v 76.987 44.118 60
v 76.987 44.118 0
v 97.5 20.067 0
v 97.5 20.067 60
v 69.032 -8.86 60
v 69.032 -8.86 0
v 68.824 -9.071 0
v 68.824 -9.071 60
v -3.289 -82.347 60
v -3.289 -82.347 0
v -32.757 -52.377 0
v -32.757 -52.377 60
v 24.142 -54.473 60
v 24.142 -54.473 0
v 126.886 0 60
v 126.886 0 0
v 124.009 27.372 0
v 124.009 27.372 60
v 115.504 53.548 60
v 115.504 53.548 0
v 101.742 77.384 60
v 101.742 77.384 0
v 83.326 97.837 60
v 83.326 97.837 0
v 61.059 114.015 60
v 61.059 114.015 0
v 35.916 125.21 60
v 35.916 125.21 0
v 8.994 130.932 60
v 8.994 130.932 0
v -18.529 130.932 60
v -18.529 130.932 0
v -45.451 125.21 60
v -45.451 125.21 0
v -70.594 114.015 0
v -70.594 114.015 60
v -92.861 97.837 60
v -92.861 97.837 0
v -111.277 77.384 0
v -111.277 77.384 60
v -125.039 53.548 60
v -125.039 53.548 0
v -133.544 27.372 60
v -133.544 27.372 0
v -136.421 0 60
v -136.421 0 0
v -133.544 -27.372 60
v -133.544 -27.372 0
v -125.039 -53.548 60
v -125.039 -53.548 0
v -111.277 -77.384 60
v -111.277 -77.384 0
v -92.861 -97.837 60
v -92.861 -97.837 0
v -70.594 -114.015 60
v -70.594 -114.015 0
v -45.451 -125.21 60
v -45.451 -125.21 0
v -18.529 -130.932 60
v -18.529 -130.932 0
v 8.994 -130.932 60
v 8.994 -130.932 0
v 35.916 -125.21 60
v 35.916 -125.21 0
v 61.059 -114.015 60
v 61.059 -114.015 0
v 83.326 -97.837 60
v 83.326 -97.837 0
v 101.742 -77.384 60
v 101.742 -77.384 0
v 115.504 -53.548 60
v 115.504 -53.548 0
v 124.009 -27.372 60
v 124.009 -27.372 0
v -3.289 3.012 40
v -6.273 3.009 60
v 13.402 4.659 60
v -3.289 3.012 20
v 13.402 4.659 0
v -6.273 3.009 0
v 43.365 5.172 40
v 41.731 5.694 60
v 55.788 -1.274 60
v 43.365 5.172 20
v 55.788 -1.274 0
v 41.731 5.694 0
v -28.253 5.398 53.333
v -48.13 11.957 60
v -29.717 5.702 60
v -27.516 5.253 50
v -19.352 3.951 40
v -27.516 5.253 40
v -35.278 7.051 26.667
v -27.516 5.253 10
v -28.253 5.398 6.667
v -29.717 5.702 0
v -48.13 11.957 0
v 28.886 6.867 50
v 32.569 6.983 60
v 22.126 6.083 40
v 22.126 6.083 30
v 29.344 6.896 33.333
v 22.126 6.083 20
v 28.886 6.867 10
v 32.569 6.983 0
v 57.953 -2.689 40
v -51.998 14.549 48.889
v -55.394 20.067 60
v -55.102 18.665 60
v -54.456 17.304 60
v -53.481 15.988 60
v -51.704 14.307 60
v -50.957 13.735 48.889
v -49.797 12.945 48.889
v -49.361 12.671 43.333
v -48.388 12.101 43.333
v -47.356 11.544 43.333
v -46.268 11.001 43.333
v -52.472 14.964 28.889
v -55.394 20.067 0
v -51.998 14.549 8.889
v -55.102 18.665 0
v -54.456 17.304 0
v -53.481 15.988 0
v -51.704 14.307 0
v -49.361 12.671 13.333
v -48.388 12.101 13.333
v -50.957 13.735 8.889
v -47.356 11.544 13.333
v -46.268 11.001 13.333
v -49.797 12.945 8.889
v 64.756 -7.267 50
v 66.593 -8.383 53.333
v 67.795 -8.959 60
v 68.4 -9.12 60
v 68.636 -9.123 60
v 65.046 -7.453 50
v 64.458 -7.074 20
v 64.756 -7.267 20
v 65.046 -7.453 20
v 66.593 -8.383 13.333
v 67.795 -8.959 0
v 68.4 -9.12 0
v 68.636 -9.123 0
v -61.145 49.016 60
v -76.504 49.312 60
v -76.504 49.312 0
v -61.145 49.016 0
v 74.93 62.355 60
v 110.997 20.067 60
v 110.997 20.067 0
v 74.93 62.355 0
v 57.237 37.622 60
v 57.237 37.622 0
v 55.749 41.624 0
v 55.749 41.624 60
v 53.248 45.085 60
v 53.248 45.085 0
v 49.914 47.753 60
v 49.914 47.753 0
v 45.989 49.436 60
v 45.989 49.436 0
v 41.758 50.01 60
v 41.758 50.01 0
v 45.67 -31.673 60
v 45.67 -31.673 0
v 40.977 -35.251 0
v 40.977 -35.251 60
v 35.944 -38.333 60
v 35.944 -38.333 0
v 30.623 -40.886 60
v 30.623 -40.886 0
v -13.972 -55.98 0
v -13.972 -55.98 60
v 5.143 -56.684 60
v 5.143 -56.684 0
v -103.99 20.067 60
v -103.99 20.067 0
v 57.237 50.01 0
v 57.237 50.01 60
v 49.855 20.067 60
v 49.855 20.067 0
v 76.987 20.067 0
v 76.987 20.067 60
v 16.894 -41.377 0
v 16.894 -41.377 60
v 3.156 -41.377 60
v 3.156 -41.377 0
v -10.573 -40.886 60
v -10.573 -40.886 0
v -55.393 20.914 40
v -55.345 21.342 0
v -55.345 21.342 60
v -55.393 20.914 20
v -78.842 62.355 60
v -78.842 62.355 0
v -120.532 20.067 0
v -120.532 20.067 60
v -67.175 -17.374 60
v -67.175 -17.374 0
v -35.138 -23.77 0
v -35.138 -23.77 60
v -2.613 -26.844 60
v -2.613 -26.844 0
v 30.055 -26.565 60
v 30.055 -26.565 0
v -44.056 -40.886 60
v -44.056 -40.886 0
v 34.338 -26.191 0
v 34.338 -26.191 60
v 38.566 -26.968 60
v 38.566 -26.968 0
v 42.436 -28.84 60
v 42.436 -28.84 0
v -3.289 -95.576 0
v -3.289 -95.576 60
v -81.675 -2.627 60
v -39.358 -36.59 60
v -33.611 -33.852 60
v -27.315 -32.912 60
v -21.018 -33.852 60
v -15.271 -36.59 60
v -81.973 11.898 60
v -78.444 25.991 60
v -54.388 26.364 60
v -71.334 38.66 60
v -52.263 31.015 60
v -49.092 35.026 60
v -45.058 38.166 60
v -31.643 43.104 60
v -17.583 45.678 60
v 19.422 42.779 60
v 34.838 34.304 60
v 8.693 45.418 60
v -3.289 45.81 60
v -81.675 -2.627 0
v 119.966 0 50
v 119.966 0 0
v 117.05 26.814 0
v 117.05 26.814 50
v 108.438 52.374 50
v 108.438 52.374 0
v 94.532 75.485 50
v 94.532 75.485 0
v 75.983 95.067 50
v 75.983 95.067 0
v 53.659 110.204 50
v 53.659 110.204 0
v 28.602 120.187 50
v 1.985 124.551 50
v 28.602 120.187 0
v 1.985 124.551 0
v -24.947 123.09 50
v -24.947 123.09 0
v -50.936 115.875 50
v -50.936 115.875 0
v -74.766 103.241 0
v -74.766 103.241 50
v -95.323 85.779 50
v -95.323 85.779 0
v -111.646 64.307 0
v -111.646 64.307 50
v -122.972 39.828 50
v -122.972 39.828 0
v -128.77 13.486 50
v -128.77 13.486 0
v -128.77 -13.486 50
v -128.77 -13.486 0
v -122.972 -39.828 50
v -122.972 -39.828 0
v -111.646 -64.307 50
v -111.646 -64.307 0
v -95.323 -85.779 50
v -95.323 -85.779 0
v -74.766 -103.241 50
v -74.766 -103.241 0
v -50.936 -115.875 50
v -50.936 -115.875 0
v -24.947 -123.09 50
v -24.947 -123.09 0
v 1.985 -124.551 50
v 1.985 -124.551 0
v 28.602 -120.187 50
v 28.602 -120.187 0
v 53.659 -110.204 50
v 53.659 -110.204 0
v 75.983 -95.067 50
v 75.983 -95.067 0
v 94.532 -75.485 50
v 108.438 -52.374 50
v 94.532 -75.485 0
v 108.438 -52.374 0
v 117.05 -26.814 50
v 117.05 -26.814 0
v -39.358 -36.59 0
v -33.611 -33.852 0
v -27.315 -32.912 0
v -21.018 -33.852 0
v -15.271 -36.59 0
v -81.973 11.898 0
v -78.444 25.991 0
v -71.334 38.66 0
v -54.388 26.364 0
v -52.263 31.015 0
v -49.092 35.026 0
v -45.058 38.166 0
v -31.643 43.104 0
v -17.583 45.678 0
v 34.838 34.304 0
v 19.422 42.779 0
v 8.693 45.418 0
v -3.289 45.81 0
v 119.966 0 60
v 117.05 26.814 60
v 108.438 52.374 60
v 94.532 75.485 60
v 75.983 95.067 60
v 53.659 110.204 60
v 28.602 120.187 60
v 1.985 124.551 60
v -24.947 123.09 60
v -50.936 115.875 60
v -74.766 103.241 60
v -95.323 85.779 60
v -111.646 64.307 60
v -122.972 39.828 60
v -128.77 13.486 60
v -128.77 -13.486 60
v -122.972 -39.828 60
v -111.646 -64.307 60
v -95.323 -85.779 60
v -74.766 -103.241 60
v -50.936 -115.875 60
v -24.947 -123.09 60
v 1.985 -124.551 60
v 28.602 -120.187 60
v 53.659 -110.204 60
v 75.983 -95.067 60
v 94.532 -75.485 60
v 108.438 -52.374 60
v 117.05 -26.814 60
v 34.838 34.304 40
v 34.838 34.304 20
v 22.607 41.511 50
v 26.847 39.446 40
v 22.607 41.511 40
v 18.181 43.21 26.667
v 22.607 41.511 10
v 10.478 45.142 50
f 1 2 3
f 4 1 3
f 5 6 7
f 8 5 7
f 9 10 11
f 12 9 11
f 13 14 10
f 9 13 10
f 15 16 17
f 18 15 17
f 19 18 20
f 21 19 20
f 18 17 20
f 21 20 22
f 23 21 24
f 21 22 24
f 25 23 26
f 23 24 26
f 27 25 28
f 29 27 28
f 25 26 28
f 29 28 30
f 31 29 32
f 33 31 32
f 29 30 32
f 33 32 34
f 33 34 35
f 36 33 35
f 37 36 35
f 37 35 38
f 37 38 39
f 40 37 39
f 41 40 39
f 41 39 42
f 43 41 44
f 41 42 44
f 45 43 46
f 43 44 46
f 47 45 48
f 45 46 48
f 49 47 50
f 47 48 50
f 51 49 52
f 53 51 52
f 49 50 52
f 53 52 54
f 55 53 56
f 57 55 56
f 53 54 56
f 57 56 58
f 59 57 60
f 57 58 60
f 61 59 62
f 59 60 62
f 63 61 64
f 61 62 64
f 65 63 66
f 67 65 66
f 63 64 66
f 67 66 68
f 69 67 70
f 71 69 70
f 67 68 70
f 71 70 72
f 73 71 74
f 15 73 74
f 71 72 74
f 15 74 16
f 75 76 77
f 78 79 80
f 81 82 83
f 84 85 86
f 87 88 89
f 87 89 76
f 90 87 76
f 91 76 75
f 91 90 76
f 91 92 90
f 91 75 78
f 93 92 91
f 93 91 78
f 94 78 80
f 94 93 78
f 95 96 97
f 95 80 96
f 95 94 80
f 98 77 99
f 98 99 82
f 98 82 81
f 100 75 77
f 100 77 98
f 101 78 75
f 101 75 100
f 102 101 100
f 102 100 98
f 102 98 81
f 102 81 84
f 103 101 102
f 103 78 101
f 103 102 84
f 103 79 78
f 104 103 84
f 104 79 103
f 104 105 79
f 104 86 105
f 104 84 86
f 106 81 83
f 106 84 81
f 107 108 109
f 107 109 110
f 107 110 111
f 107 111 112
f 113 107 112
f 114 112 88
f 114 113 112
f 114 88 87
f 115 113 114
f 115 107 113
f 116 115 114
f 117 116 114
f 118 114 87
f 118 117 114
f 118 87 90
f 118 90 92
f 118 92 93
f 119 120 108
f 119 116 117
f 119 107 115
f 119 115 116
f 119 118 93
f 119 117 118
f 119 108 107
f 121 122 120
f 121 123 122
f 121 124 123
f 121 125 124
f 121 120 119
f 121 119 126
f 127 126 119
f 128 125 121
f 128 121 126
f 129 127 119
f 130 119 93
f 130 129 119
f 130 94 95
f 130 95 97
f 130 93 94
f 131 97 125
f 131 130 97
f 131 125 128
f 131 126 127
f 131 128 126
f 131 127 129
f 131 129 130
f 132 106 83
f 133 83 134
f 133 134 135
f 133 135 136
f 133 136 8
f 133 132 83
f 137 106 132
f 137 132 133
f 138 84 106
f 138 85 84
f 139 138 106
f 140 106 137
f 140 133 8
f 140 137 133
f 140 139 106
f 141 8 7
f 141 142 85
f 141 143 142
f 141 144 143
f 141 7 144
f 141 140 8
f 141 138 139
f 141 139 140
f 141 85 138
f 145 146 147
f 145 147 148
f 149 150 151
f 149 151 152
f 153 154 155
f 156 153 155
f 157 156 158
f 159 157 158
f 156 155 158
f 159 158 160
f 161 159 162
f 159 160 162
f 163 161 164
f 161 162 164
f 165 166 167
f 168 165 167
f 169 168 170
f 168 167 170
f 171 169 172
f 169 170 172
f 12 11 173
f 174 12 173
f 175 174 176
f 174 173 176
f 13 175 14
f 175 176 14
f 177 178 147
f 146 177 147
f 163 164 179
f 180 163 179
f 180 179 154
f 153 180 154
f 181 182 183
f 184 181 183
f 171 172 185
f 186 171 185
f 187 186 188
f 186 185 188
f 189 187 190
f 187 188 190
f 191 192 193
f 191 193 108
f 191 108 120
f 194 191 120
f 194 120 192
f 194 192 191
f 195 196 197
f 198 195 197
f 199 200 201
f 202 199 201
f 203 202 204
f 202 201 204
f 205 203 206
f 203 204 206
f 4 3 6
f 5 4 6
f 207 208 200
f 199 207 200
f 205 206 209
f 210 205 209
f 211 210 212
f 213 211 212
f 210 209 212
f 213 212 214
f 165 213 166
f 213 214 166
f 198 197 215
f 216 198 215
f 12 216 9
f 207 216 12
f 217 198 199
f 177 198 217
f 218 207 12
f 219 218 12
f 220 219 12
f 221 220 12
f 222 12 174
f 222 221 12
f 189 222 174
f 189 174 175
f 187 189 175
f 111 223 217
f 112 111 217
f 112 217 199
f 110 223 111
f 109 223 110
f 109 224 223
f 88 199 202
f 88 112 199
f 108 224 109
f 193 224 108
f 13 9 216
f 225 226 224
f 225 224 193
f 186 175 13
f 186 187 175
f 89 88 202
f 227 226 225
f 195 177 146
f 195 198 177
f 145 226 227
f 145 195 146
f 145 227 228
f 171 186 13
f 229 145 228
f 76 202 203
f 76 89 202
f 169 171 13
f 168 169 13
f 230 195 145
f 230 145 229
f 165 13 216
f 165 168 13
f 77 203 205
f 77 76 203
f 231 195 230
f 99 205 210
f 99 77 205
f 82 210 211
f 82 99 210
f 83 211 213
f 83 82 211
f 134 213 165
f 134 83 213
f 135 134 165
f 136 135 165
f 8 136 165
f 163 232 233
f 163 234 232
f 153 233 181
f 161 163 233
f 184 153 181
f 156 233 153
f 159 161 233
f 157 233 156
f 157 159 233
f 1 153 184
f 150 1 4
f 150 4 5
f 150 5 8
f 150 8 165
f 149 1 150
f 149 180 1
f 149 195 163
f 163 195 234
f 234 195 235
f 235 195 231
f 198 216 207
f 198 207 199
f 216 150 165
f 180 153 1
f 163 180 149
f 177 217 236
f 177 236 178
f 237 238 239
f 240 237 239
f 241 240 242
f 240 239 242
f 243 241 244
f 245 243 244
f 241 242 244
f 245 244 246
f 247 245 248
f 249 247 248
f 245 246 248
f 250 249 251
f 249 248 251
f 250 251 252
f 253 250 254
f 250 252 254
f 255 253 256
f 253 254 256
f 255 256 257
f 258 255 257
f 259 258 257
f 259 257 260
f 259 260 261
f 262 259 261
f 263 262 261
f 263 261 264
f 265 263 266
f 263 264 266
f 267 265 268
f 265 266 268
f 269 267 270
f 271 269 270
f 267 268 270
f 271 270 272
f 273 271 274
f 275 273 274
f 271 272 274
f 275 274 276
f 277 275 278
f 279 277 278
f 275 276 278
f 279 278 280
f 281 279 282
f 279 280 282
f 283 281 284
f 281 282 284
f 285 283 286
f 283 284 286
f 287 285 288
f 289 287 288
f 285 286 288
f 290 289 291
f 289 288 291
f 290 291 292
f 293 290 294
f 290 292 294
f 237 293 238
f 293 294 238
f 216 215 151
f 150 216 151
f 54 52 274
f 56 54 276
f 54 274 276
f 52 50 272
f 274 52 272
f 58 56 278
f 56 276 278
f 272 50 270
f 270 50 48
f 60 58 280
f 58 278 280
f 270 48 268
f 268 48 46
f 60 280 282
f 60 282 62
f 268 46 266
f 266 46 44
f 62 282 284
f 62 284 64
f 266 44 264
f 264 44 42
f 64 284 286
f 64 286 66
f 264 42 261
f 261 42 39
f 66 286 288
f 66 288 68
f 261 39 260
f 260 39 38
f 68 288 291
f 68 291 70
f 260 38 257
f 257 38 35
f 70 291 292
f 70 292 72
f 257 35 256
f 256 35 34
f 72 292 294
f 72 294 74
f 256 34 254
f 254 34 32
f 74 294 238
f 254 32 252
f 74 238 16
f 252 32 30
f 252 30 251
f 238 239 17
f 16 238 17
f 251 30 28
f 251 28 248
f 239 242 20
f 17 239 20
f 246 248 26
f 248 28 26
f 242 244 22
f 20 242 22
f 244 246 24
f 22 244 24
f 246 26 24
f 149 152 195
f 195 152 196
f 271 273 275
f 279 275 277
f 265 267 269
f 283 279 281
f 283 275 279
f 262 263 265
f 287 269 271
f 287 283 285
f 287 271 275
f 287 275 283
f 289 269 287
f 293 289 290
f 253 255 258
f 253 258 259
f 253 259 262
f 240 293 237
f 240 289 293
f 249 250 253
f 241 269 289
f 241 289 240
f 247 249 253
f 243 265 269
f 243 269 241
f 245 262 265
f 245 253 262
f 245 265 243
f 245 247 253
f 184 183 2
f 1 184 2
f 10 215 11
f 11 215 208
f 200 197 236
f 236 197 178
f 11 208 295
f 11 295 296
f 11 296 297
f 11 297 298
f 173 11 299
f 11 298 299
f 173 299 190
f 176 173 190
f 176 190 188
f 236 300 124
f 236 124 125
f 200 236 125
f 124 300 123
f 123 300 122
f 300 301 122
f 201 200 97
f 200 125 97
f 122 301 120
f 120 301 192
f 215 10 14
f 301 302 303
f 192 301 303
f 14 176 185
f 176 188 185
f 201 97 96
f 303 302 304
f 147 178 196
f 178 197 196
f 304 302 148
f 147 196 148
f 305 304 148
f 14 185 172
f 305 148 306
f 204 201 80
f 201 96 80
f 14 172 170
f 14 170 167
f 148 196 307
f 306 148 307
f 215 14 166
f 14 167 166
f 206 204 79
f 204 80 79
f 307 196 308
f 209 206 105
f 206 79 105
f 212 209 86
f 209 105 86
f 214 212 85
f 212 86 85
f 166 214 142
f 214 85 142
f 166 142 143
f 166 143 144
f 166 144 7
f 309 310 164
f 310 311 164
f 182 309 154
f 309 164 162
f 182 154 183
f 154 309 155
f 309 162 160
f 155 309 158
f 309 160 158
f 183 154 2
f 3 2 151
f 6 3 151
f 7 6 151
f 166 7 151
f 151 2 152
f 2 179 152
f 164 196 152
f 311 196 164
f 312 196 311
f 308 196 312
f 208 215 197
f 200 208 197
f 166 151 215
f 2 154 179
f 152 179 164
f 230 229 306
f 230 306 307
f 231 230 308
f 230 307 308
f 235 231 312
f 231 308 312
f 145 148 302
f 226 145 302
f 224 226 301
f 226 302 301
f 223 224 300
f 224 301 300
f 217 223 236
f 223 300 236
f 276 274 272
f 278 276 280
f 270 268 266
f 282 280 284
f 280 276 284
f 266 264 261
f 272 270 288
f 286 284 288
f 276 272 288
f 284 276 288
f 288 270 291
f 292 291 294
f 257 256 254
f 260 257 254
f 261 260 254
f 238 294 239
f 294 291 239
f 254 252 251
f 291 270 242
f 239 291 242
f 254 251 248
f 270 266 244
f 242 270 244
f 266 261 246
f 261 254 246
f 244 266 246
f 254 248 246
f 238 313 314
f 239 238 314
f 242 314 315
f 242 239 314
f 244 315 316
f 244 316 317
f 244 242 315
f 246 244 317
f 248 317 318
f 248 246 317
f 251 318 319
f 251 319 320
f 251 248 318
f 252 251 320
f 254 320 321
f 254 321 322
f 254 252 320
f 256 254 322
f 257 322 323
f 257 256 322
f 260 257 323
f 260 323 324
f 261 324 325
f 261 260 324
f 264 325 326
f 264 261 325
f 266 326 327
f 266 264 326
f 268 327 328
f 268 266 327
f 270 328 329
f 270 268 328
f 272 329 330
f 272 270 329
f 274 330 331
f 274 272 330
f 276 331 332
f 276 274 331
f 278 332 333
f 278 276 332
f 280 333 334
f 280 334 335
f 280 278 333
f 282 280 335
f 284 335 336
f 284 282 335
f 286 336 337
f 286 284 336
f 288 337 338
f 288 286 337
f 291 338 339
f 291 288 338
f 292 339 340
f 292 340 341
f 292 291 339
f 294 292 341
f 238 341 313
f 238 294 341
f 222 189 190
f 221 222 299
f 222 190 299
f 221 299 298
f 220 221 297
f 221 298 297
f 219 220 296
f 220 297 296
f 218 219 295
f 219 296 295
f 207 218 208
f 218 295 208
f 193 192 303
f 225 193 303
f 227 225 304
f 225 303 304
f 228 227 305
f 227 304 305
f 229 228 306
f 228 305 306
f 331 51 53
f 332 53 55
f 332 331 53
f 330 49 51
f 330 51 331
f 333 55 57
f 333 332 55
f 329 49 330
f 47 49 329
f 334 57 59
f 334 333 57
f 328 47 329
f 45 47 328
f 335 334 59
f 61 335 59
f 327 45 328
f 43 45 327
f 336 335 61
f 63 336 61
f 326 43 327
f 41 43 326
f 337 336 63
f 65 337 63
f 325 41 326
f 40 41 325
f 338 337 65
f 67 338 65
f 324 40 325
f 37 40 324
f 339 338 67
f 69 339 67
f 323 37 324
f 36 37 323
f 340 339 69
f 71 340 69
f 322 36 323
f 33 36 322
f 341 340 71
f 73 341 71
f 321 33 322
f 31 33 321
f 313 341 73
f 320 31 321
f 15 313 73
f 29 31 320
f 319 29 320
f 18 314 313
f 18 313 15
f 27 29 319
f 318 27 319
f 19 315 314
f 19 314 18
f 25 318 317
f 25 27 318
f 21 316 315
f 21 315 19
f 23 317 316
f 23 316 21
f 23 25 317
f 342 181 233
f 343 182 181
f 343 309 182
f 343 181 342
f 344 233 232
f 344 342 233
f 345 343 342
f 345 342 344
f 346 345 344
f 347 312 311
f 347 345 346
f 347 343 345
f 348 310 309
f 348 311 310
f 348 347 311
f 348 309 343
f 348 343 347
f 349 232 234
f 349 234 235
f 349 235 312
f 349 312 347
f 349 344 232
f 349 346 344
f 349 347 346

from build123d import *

# Parameters (mm, degrees)
F1_DEPTH = 60
F2_R     = 131.6532822565
F2_R_2   = 124.7334894873
F3_DEPTH = 60
F4_DEPTH = 50


with BuildPart() as f1:
    # F0 (on Top) → F1 (new body)
    with BuildSketch(Plane.XY):
        Polygon((74.9296570044, 62.355361724), (-78.8422822756, 62.355361724), (-120.5317750377, 20.0672930421), (-3.2890513343, -95.5764094054), (110.9969020086, 20.0672930421), align=None)
        with BuildLine():
            ThreePointArc((30.6225829023, -40.886171317), (10.024576741, -41.4386449004), (-10.5734294202, -40.886171317))
            ThreePointArc((-10.5734294202, -40.886171317), (-27.3146695696, -32.9122104229), (-44.055909719, -40.886171317))
            Line((-44.055909719, -40.886171317), (-67.174919563, -17.3738146812))
            ThreePointArc((-67.174919563, -17.3738146812), (-18.9151123365, -25.7248463855), (30.0547086439, -26.5647018575))
            ThreePointArc((30.0547086439, -26.5647018575), (38.5659779212, -26.967690046), (45.6699691909, -31.6727311968))
            ThreePointArc((45.6699691909, -31.6727311968), (38.4995277759, -36.8563818233), (30.6225829023, -40.886171317))
        make_face(mode=Mode.SUBTRACT)
        with BuildLine():
            Line((24.142164092, -54.4732124549), (-3.2890513343, -82.3466369568))
            Line((-3.2890513343, -82.3466369568), (-32.7572226476, -52.3770942299))
            ThreePointArc((-32.7572226476, -52.3770942299), (-4.428048629, -56.6966659367), (24.142164092, -54.4732124549))
        make_face(mode=Mode.SUBTRACT)
        with BuildLine():
            Line((-81.67515814, -2.6268690711), (-103.989661336, 20.0672930421))
            Line((-103.989661336, 20.0672930421), (-76.5038450393, 49.3119040818))
            Line((-76.5038450393, 49.3119040818), (-61.1454658014, 49.0162855328))
            ThreePointArc((-61.1454658014, 49.0162855328), (-78.4436240705, 25.9906593039), (-81.67515814, -2.6268690711))
        make_face(mode=Mode.SUBTRACT)
        with BuildLine():
            Line((76.9870403049, 20.0672930421), (76.9870403049, 44.1184047228))
            Line((76.9870403049, 44.1184047228), (97.5000919682, 20.0672930421))
            Line((97.5000919682, 20.0672930421), (69.0316228459, -8.8601063616))
            add(Edge.make_bspline(
                [(68.8241100173, -9.0709644323), (68.9152133704, -9.0266250767), (68.9840910354, -8.9558840502), (69.0316228459, -8.8601063616)],
                knots=[0.8556335845, 0.8556335845, 0.8556335845, 0.8556335845, 0.8617790869, 0.8617790869, 0.8617790869, 0.8617790869], degree=3))
            add(Edge.make_bspline(
                [(-55.3941001687, 20.0672930421), (-54.6137788828, 9.8420286504), (2.8320946288, -4.0014398965), (39.1107514545, 15.5059780363), (66.8637435516, -10.0250608833), (68.8241100173, -9.0709644323)],
                knots=[0.3747893908, 0.3747893908, 0.3747893908, 0.3747893908, 0.5560743676, 0.723394359, 0.8556335845, 0.8556335845, 0.8556335845, 0.8556335845], degree=3))
            add(Edge.make_bspline(
                [(-55.3453841257, 21.3418374189), (-55.4091134145, 20.912536879), (-55.4261568649, 20.4873612884), (-55.3941001687, 20.0672930421)],
                knots=[0.367341949, 0.367341949, 0.367341949, 0.367341949, 0.3747893908, 0.3747893908, 0.3747893908, 0.3747893908], degree=3))
            ThreePointArc((-55.3453841257, 21.3418374189), (-52.2632242925, 31.0147803908), (-45.0575761301, 38.1662955822))
            ThreePointArc((-45.0575761301, 38.1662955822), (-24.6682987221, 44.6929576974), (-3.2890513343, 45.8099772682))
            add(Edge.make_bspline(
                [(49.8549297409, 20.0672930421), (35.5399556775, 36.338533457), (19.7655314176, 47.3009599168), (-3.2890513343, 45.8099772682)],
                knots=[0, 0, 0, 0, 0.1881410109, 0.1881410109, 0.1881410109, 0.1881410109], degree=3))
            Line((49.8549297409, 20.0672930421), (76.9870403049, 20.0672930421))
        make_face(mode=Mode.SUBTRACT)
        with BuildLine():
            ThreePointArc((57.2370365458, 37.6215761842), (51.6712340933, 46.5316736156), (41.7582169371, 50.0101911218))
            Line((41.7582169371, 50.0101911218), (57.2370365458, 50.0101911218))
            Line((57.2370365458, 50.0101911218), (57.2370365458, 37.6215761842))
        make_face(mode=Mode.SUBTRACT)
        with BuildLine():
            add(Edge.make_bspline(
                [(68.8241100173, -9.0709644323), (68.9152133704, -9.0266250767), (68.9840910354, -8.9558840502), (69.0316228459, -8.8601063616)],
                knots=[0.8556335845, 0.8556335845, 0.8556335845, 0.8556335845, 0.8617790869, 0.8617790869, 0.8617790869, 0.8617790869], degree=3))
            Line((69.0316228459, -8.8601063616), (68.8241100173, -9.0709644323))
        make_face()
    extrude(amount=F1_DEPTH)


with BuildPart() as f3:
    # F2 (on Top) → F3 (new body)
    with BuildSketch(Plane.XY):
        with Locations((-4.7674374655, 0)):
            Circle(F2_R)
        with Locations((-4.7674374655, 0)):
            Circle(F2_R_2, mode=Mode.SUBTRACT)
    extrude(amount=F3_DEPTH)


with BuildPart() as f4:
    # F2 (on Top) → F4 (new body)
    with BuildSketch(Plane.XY):
        with Locations((-4.7674374655, 0)):
            Circle(F2_R_2)
    extrude(amount=F4_DEPTH)


solid = Compound([f1.part, f3.part, f4.part])
